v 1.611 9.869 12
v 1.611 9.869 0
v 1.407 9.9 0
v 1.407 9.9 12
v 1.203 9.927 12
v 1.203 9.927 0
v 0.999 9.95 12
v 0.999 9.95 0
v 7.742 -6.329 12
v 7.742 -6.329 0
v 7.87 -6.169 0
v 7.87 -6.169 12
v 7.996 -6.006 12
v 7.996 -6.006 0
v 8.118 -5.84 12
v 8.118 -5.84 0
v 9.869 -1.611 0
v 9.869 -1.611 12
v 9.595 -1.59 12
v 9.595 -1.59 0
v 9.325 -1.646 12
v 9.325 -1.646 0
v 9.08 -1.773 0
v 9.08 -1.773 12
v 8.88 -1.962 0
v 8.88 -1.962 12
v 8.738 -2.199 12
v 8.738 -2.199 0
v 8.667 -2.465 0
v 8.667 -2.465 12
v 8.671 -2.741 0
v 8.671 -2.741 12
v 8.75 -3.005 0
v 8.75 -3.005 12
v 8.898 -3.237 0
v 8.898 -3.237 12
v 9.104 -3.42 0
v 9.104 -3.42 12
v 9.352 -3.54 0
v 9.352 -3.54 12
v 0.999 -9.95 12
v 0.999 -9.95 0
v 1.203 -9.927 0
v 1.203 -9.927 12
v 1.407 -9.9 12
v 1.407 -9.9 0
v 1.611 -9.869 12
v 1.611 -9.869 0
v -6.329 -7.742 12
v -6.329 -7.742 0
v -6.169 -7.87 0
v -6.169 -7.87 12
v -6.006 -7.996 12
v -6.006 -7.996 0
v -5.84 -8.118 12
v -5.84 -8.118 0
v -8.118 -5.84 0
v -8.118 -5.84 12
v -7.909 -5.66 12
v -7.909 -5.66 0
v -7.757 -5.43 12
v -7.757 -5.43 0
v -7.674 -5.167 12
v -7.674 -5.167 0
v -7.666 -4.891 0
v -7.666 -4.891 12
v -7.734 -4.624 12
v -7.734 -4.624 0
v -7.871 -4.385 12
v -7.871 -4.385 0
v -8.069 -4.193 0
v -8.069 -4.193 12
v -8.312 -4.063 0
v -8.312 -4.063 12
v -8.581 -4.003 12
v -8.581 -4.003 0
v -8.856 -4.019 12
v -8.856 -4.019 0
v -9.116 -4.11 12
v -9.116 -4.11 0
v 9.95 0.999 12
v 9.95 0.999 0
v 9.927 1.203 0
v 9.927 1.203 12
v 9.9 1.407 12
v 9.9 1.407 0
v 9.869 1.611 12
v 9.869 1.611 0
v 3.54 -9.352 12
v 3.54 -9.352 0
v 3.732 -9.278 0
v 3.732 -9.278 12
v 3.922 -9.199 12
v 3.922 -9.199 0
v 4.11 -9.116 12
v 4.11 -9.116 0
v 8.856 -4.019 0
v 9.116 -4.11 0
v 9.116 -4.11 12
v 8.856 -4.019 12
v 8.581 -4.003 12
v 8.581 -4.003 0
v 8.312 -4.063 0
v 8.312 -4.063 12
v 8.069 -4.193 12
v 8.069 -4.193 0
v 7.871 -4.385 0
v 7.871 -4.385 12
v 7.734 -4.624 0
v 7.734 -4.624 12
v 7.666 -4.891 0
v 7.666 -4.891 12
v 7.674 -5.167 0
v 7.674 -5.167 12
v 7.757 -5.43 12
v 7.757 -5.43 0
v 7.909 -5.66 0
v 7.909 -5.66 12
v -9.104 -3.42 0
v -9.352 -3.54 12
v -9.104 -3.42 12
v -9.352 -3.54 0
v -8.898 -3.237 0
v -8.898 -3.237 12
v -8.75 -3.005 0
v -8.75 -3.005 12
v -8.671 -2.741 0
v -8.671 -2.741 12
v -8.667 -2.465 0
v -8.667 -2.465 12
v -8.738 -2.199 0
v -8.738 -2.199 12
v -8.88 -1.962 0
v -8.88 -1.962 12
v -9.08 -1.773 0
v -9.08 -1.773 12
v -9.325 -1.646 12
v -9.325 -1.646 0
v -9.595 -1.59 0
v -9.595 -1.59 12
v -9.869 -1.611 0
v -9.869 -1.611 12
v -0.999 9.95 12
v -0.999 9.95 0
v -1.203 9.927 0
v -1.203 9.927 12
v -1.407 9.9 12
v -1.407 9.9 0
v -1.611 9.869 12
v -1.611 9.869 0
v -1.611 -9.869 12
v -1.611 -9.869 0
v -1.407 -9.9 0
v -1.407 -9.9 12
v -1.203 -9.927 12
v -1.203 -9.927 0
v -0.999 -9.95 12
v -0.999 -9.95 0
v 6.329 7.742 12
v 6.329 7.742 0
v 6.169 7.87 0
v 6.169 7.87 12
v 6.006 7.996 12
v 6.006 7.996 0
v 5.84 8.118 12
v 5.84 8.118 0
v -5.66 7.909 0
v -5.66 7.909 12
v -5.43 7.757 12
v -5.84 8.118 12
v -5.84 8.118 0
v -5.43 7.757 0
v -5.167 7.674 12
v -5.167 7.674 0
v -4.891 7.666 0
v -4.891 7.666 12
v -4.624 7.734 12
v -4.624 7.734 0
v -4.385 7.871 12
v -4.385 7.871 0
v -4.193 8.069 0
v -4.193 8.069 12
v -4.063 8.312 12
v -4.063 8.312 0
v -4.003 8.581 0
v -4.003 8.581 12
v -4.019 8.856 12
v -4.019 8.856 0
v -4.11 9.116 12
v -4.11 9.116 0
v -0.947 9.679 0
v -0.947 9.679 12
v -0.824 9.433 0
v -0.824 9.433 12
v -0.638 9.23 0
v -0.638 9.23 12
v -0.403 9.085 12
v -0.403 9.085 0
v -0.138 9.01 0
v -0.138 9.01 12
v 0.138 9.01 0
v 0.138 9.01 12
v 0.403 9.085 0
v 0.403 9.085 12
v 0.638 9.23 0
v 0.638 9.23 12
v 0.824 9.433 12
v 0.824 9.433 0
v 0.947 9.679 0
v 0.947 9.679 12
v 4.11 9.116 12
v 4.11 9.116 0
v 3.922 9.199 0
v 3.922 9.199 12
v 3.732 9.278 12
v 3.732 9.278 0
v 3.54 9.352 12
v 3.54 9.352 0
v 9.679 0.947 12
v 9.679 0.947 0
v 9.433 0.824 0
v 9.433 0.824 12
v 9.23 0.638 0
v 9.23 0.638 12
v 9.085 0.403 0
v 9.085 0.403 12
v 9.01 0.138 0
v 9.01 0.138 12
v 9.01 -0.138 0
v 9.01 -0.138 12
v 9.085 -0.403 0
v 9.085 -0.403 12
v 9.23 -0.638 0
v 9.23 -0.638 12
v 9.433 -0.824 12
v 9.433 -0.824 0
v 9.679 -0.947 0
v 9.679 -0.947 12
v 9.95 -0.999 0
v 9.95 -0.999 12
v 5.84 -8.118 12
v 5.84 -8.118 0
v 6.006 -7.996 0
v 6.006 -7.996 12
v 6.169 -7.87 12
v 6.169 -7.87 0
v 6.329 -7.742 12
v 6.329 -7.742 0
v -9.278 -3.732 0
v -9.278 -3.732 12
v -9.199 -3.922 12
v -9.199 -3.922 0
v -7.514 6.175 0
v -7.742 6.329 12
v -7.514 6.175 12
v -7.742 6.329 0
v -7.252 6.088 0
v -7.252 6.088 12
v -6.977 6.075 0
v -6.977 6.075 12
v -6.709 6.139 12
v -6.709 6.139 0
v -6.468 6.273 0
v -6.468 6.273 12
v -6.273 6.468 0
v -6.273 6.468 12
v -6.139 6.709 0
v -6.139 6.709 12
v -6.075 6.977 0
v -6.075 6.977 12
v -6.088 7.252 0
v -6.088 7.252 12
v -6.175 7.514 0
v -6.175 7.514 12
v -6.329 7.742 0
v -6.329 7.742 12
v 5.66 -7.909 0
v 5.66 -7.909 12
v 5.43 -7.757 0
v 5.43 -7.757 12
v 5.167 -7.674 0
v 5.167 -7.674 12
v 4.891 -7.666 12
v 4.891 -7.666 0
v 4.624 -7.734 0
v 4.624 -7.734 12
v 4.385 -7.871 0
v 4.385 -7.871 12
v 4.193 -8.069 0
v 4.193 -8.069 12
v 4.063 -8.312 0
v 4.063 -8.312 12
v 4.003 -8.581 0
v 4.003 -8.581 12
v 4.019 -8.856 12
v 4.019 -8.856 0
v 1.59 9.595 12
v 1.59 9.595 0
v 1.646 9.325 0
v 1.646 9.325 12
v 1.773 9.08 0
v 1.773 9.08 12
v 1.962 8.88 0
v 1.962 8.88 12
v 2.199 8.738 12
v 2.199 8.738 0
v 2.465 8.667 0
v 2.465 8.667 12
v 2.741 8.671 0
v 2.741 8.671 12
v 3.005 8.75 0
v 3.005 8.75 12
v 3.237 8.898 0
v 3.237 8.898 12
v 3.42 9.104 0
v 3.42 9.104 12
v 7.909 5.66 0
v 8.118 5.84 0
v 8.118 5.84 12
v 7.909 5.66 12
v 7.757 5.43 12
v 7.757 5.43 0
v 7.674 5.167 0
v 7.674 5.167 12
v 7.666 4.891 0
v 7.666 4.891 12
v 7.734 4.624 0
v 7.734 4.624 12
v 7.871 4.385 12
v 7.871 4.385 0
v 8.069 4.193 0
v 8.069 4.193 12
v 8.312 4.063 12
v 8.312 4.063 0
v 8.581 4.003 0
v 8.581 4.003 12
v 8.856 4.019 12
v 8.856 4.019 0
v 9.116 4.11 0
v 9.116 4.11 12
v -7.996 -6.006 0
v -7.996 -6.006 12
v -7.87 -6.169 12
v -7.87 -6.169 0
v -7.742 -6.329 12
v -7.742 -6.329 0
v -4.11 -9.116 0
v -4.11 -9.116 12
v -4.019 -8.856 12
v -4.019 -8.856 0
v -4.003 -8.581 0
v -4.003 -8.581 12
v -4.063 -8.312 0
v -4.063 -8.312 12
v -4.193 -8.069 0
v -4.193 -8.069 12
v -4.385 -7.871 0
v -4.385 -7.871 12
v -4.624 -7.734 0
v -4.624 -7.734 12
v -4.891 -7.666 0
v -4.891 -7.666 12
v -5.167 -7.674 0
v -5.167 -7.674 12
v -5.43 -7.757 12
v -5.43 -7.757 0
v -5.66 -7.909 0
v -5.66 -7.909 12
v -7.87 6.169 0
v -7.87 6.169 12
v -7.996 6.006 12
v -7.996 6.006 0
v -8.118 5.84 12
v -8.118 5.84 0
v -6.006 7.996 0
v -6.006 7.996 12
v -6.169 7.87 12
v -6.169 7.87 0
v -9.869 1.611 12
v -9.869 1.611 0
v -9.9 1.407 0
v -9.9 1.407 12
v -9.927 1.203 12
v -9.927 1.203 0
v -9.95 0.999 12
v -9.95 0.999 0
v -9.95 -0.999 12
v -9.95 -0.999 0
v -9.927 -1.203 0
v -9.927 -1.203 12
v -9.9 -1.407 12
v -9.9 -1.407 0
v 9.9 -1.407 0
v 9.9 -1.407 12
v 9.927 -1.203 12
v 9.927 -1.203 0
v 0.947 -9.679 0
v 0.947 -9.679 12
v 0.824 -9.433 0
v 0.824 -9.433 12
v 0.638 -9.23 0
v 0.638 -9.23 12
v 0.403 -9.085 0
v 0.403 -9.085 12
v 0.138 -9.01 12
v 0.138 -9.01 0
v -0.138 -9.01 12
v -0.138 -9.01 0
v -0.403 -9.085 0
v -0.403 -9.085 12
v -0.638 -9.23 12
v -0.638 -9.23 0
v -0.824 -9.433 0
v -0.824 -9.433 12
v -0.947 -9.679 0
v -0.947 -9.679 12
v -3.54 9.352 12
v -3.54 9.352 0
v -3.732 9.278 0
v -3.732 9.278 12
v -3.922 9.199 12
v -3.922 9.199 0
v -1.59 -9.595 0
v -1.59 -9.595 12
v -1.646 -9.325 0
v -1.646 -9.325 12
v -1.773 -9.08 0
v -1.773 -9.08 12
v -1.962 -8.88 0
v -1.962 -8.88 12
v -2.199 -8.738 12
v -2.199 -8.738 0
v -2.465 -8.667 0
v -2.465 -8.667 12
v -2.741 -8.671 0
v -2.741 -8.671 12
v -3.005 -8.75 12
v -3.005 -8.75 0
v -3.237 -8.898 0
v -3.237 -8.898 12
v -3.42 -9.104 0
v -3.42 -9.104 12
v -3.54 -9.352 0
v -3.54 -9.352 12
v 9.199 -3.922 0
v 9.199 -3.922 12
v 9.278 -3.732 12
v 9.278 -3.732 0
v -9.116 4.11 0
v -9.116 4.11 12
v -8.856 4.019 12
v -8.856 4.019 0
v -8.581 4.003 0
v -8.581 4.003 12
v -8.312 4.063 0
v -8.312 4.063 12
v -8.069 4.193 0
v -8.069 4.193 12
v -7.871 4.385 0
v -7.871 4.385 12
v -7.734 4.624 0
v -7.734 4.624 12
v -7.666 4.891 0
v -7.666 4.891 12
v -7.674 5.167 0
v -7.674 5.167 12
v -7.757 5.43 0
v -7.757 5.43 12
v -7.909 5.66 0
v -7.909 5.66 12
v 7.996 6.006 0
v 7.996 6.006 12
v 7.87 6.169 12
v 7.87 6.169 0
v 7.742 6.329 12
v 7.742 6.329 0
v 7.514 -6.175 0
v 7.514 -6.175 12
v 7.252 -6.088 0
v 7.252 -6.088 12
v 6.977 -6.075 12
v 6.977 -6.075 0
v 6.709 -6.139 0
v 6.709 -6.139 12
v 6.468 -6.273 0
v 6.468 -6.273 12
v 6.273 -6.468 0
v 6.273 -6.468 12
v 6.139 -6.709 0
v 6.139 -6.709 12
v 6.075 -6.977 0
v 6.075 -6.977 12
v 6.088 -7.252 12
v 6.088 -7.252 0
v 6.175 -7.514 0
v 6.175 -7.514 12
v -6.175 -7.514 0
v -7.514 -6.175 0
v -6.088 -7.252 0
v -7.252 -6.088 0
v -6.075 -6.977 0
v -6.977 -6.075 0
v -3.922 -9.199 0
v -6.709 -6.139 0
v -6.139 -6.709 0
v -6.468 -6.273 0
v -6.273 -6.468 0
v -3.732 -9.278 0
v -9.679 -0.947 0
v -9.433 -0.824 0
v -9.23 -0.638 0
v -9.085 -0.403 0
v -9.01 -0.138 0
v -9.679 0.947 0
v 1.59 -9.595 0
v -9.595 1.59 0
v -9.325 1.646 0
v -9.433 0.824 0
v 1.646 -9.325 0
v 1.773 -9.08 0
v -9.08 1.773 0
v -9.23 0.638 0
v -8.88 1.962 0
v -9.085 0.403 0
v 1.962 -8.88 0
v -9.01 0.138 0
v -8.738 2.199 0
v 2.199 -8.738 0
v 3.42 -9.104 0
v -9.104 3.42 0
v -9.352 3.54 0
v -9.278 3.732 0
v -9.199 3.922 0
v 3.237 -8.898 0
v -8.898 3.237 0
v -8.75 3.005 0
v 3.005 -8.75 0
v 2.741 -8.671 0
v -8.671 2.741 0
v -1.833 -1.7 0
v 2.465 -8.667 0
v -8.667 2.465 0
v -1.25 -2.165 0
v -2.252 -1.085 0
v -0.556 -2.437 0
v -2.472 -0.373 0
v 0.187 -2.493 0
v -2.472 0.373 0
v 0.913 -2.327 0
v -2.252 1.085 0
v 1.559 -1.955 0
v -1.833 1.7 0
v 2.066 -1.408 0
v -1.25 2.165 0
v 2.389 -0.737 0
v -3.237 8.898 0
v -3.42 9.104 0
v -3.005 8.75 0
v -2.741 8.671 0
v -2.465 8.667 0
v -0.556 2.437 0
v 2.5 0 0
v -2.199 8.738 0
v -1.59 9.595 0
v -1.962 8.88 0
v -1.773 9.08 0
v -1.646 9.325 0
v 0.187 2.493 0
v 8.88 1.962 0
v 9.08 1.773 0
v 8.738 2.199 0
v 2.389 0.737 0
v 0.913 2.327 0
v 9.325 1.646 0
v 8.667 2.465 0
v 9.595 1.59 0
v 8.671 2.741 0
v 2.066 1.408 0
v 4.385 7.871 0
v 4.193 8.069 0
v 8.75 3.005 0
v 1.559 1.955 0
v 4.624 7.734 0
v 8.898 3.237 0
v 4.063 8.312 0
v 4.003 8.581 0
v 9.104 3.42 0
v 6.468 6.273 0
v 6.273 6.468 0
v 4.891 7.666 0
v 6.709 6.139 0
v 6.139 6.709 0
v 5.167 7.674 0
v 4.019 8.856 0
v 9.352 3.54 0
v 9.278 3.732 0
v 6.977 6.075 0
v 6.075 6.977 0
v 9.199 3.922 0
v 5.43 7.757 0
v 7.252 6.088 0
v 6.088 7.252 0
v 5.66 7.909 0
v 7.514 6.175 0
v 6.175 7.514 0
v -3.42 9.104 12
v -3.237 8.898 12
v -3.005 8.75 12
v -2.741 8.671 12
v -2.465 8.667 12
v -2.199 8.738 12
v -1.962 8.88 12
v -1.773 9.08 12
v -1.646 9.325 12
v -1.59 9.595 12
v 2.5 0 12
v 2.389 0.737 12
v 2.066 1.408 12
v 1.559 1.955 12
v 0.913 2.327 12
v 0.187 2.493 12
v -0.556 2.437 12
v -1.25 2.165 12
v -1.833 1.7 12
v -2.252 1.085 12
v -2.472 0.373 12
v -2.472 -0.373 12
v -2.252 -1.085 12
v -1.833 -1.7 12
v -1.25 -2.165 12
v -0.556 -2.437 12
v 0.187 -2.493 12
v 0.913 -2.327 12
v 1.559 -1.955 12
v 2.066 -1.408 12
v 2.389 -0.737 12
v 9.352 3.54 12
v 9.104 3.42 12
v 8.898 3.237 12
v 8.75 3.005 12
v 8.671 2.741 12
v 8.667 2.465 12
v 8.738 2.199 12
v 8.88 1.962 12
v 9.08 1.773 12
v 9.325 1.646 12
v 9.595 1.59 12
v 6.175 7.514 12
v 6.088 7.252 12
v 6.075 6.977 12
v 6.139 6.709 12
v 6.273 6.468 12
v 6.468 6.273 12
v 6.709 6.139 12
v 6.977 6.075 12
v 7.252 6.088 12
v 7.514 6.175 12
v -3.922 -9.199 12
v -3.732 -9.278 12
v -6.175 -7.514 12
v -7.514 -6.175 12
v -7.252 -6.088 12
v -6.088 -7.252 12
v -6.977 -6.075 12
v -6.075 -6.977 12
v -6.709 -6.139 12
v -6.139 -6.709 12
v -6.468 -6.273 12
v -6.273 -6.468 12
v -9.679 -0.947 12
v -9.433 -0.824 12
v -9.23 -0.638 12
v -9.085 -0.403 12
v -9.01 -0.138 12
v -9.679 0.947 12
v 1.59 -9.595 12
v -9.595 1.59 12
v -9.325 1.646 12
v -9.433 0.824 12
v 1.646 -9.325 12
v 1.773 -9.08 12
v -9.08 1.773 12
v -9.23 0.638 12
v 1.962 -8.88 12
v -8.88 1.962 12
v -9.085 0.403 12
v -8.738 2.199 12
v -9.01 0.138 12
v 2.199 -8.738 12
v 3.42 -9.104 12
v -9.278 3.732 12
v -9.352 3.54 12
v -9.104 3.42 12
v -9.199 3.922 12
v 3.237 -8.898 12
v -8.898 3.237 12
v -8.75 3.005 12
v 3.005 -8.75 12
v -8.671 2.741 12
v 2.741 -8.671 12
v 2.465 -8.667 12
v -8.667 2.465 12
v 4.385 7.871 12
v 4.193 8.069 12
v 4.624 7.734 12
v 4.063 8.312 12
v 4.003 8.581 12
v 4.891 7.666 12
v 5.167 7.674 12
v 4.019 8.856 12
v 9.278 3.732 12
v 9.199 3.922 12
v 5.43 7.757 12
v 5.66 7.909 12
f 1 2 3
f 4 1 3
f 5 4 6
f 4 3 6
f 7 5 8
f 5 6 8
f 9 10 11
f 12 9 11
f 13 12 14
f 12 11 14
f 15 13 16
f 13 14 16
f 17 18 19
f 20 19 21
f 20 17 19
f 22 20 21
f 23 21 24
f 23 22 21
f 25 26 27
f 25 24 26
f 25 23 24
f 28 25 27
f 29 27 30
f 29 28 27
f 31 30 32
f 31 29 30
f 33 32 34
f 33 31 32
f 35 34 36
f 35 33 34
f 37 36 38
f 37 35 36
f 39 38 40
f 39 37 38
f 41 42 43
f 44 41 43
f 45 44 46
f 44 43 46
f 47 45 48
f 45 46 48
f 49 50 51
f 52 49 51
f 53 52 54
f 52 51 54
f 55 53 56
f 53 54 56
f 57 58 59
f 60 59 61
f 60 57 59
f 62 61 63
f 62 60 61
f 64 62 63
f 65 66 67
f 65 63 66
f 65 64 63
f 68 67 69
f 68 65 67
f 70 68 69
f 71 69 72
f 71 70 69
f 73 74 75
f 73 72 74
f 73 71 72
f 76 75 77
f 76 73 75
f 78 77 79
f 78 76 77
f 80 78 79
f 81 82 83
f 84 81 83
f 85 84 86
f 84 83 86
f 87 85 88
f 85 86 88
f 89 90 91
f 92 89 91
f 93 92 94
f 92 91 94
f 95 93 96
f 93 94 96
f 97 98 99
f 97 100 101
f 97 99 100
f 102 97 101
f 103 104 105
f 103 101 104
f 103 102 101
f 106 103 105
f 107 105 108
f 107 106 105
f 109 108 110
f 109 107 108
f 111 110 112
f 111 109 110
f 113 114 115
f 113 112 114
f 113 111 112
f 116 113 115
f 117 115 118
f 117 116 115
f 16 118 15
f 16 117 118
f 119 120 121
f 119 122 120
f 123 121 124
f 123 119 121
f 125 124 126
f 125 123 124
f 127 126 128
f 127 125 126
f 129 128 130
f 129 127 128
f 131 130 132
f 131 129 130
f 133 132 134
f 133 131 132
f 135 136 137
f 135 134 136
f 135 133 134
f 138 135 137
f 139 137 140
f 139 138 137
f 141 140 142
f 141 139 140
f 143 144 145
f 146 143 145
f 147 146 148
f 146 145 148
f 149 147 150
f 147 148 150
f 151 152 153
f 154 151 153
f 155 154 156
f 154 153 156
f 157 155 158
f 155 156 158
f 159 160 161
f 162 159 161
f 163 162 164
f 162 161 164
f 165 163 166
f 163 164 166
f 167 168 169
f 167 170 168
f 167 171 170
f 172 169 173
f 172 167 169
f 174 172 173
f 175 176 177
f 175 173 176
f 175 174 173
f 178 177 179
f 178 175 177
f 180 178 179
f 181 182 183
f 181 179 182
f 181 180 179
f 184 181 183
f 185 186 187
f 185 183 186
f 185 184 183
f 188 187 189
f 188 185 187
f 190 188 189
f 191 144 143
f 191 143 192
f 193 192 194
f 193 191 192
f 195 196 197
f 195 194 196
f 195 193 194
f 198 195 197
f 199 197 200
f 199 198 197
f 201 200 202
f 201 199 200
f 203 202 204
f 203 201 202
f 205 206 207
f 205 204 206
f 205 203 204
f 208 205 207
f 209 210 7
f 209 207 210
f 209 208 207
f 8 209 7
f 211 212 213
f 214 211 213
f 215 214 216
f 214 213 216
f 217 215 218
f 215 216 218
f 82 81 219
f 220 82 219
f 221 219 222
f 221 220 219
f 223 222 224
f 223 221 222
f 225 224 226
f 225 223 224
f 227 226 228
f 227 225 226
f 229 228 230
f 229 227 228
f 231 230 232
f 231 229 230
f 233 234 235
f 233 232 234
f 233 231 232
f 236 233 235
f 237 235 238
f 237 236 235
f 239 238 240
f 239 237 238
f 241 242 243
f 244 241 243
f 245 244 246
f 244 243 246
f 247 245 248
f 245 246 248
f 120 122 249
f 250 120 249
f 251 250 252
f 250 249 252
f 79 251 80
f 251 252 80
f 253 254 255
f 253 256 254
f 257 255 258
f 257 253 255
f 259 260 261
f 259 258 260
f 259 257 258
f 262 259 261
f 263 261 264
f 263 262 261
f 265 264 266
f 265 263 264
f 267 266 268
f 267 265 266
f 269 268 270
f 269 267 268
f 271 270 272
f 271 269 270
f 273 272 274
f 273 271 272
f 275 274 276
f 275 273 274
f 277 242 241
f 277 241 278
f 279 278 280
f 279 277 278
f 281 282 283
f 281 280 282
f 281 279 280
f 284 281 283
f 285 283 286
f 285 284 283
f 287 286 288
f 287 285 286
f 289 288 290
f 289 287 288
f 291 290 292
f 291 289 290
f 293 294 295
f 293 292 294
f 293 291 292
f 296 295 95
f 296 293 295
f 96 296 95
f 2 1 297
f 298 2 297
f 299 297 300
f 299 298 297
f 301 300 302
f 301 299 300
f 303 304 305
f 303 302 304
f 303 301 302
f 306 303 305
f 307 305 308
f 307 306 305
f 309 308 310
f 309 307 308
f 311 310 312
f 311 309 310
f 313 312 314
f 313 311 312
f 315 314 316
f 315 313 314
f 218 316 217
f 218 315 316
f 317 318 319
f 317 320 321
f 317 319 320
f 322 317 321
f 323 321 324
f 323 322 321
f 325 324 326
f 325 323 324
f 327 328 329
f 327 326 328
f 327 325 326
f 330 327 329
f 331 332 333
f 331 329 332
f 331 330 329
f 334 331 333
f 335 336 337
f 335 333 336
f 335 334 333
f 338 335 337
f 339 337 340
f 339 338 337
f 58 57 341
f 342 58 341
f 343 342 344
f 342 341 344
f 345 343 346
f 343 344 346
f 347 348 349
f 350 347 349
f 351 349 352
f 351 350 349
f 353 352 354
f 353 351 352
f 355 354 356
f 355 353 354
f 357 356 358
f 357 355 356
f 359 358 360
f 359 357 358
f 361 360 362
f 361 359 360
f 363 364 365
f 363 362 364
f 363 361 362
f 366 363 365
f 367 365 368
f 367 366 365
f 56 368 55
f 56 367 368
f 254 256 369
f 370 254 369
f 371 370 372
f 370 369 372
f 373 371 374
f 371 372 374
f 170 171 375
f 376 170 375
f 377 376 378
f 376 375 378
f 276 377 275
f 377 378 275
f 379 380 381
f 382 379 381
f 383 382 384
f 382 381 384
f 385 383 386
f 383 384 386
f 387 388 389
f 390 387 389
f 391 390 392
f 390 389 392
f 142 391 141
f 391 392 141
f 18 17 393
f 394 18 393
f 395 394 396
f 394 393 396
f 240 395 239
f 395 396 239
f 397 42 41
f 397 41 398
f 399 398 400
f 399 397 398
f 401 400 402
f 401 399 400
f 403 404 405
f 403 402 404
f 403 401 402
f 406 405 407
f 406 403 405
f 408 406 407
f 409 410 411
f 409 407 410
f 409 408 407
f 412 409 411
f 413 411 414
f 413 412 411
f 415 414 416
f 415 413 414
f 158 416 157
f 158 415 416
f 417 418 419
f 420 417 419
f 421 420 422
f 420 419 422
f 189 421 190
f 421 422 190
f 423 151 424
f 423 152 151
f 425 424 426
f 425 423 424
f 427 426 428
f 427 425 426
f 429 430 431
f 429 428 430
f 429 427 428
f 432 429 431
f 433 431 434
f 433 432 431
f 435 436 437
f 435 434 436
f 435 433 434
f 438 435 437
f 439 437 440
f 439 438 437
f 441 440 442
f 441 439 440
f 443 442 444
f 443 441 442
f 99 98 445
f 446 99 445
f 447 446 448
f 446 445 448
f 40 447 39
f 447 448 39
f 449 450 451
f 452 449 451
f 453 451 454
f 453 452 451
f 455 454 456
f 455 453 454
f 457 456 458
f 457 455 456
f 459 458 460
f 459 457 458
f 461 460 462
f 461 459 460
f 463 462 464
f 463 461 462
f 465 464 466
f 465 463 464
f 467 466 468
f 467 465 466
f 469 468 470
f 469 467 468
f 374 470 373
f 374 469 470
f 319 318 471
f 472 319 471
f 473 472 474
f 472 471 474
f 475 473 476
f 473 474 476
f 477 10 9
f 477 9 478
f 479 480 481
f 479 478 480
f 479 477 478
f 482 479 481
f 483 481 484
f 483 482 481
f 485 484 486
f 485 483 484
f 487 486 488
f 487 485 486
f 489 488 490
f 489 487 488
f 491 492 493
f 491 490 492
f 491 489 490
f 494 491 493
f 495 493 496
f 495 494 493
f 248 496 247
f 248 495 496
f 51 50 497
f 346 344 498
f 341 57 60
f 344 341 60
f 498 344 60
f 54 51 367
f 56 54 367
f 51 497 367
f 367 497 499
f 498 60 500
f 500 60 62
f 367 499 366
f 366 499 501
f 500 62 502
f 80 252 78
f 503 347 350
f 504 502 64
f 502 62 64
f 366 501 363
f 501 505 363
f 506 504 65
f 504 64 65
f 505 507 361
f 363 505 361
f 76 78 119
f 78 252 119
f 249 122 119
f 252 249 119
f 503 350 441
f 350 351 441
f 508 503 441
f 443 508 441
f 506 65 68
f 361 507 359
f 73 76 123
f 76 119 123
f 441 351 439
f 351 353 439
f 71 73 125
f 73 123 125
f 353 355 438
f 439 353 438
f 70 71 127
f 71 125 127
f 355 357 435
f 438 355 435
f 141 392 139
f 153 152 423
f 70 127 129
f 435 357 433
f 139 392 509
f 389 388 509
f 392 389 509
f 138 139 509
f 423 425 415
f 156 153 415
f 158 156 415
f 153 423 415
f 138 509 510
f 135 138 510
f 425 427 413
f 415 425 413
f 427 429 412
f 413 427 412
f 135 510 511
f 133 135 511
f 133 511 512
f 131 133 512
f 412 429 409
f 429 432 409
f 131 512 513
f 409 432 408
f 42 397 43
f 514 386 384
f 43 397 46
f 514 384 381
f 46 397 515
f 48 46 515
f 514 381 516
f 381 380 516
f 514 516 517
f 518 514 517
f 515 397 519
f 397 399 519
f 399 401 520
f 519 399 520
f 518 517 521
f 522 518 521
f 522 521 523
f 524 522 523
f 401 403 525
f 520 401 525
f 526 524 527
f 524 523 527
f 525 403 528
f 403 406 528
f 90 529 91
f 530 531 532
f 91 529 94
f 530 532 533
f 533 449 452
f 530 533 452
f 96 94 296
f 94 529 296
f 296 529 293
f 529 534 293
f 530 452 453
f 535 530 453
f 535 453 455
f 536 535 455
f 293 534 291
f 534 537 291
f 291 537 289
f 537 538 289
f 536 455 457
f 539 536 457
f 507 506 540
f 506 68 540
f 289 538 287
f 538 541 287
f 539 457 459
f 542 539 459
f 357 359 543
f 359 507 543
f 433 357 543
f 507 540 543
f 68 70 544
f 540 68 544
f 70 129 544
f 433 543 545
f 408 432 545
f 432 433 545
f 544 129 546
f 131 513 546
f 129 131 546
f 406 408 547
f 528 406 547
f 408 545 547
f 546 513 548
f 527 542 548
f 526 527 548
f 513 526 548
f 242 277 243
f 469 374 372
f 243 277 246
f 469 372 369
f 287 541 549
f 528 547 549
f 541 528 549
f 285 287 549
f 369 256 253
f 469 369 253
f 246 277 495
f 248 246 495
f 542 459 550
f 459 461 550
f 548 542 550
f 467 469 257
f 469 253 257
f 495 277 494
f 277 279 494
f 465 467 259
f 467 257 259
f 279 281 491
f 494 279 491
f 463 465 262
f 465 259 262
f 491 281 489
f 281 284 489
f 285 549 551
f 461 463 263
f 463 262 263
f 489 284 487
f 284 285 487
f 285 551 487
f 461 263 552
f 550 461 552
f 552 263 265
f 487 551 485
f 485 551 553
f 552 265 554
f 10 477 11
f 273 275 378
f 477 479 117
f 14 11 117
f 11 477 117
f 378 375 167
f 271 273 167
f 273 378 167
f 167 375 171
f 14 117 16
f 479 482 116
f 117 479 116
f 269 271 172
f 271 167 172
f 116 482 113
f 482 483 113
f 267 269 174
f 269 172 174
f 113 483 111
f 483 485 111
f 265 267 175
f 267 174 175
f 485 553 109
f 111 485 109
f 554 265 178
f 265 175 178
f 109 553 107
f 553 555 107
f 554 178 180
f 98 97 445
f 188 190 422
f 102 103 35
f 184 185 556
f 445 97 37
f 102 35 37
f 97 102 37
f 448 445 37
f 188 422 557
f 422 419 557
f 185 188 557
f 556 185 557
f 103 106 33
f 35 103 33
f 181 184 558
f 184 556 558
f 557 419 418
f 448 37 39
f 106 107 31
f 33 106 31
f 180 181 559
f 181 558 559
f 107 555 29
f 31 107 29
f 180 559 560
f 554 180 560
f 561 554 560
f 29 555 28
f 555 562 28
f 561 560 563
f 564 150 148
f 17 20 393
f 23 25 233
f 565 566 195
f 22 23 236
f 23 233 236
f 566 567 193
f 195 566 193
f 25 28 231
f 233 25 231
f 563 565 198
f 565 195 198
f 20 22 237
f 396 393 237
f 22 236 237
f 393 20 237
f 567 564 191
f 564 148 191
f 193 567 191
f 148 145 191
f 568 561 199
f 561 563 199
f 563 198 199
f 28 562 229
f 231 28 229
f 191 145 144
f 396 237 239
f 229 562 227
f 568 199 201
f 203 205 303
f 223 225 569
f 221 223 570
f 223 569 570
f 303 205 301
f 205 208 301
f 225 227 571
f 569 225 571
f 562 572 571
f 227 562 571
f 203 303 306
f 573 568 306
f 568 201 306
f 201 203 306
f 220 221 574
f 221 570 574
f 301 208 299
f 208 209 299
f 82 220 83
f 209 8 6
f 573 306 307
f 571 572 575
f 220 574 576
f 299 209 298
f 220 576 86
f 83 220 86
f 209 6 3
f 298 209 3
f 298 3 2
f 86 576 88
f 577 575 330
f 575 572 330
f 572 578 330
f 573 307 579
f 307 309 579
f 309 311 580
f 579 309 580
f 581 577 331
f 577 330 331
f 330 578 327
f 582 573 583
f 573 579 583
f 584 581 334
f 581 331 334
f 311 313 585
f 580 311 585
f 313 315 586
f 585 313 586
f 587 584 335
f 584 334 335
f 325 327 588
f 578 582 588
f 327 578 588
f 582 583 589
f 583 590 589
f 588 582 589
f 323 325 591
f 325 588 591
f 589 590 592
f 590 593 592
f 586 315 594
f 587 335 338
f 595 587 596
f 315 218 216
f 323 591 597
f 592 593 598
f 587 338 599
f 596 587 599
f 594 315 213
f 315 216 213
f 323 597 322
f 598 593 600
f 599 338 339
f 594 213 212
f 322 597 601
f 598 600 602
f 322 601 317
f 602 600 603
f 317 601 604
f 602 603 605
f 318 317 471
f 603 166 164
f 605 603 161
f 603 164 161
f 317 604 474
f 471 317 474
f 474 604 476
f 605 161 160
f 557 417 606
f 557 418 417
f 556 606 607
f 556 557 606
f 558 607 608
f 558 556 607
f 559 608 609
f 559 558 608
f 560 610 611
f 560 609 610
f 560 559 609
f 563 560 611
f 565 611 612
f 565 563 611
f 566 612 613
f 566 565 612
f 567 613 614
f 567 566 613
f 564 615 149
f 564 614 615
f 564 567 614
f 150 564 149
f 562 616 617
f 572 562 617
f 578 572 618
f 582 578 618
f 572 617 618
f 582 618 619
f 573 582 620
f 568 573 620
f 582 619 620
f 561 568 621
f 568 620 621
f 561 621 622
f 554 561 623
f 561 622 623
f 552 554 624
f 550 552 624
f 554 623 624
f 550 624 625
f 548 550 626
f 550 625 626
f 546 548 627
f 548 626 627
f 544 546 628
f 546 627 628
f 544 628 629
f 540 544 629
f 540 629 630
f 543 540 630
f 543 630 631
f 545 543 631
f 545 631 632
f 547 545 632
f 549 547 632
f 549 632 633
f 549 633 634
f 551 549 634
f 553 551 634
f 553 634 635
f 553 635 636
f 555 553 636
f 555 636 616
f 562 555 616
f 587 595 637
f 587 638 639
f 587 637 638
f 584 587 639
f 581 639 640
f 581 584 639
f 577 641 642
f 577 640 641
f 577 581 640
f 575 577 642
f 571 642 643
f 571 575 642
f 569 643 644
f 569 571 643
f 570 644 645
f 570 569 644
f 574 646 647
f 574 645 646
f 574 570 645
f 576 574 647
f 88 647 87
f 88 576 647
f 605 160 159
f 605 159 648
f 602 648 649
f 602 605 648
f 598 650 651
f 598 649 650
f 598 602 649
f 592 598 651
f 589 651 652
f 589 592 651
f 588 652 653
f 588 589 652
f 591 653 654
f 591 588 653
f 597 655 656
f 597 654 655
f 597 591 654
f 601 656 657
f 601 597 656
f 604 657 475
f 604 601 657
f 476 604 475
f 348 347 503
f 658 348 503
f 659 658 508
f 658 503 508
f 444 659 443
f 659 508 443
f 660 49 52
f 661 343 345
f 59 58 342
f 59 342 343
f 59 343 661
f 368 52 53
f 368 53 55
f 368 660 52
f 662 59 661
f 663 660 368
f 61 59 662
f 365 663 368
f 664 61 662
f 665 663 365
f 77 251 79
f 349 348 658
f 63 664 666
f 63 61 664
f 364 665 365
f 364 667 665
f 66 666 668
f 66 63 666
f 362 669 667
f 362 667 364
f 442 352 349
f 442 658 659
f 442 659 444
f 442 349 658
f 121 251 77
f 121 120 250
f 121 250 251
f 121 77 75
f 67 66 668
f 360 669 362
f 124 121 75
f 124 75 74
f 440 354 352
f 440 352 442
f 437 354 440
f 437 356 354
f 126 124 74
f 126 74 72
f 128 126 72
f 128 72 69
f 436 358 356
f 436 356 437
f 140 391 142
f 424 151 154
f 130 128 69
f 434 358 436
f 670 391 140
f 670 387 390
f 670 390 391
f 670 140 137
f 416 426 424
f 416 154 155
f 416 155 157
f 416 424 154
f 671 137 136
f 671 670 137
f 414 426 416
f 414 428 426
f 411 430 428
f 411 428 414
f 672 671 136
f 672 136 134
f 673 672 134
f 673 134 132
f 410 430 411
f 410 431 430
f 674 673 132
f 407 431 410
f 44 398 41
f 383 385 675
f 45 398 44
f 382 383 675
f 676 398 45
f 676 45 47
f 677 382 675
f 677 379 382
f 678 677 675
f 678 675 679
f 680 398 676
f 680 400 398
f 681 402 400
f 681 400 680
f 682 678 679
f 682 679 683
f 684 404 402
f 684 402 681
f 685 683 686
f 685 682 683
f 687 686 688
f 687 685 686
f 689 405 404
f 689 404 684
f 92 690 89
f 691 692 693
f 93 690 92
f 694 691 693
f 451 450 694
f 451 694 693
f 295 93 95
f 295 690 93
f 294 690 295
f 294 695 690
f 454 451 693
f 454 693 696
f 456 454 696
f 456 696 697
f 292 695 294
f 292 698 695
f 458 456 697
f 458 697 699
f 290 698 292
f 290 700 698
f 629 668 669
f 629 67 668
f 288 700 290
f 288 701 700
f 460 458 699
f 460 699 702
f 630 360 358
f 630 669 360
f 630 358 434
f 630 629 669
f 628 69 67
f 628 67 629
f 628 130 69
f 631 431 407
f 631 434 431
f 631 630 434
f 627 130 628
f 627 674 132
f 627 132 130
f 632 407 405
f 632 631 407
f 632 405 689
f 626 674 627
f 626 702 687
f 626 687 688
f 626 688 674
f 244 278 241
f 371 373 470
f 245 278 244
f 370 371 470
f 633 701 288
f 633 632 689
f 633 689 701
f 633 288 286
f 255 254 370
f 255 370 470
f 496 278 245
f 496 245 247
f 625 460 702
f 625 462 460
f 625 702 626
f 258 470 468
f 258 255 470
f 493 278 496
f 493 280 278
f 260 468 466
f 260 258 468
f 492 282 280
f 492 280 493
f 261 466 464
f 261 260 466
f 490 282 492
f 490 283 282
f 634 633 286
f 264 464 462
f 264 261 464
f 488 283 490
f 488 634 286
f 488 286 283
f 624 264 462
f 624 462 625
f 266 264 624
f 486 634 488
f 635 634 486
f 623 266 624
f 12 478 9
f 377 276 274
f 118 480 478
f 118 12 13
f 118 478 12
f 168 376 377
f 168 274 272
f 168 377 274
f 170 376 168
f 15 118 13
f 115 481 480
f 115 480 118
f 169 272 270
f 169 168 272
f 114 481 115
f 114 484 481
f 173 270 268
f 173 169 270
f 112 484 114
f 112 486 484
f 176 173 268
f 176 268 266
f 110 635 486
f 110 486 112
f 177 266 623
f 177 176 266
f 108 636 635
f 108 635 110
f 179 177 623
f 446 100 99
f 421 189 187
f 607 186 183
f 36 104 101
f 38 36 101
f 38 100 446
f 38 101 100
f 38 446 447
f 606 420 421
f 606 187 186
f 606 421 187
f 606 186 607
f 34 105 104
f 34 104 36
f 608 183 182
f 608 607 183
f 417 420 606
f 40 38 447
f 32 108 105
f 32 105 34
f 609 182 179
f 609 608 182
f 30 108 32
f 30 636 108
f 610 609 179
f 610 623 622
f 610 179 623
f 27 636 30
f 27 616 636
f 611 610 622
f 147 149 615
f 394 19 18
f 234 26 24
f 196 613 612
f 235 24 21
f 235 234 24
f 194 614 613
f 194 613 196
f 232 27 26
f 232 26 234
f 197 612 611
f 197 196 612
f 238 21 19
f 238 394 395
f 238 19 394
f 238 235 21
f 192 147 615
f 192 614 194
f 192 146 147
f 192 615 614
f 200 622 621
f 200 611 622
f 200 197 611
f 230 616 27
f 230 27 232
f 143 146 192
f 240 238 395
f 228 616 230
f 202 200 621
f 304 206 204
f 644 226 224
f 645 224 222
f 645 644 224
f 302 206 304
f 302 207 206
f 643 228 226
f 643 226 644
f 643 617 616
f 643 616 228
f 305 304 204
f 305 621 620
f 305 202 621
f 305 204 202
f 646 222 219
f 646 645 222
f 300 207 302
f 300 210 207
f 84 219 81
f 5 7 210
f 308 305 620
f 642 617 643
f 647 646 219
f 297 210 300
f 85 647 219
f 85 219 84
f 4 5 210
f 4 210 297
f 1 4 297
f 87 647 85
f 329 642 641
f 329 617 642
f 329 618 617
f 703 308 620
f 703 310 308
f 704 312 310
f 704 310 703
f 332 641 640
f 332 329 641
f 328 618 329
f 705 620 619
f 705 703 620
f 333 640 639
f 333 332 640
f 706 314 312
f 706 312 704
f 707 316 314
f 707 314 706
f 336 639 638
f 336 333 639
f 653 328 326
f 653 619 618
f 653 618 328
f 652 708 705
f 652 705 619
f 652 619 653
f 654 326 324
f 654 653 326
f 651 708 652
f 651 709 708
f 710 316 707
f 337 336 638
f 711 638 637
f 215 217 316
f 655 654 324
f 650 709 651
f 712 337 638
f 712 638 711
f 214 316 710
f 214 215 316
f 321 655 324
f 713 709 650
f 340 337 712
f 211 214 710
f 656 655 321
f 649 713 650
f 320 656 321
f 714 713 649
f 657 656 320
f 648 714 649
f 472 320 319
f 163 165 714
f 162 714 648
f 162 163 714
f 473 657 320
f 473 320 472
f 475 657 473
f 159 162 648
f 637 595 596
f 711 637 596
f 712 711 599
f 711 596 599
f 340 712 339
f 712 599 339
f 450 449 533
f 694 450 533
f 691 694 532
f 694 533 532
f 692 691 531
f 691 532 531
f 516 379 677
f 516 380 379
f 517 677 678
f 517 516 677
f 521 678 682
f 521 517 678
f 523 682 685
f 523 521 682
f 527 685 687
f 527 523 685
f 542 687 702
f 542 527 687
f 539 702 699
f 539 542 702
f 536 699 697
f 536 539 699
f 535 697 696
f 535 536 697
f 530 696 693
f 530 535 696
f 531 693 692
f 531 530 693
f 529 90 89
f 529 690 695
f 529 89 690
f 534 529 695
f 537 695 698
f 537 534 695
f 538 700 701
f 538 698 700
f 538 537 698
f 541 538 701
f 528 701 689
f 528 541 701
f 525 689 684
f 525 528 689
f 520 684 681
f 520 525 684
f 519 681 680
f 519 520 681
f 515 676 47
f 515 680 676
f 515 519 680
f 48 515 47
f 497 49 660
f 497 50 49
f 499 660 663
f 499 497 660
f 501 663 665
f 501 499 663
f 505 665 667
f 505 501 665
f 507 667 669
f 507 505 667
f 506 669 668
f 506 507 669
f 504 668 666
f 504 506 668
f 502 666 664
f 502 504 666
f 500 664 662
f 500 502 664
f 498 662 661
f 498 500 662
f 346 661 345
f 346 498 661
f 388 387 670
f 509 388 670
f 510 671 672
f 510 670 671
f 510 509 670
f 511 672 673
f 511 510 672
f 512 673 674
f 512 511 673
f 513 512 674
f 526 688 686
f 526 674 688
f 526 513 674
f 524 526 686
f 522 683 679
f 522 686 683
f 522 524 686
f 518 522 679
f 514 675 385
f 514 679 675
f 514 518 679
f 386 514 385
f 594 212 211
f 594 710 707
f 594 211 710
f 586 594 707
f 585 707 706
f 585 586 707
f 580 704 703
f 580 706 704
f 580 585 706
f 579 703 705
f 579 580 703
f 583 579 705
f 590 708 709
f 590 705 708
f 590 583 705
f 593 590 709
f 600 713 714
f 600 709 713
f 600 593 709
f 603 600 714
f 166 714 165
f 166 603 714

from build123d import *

# Parameters (mm, degrees)
SKETCH1_R               = 10
BOSS_EXTRUDE1_DEPTH     = 12
CUT_EXTRUDE1_DEPTH      = 19.547236991
CUT_EXTRUDE1_DEPTH_BACK = 19.547236991
SKETCH2_R               = 1
SKETCH3_R               = 2.5
CUT_EXTRUDE2_DEPTH      = 19.493377193


with BuildPart() as part:
    # Sketch1 → Boss-Extrude1 (new body)
    with BuildSketch(Plane.XY):
        Circle(SKETCH1_R)
    extrude(amount=BOSS_EXTRUDE1_DEPTH)

    # Sketch2 → Cut-Extrude1 (cut, two sides: drawn at the far end of the back side and taken through both)
    with BuildSketch(Plane.XY.offset(12).offset(-CUT_EXTRUDE1_DEPTH_BACK)):
        with Locations((0, 10)):
            Circle(SKETCH2_R)
        with Locations((2.588190451, 9.659258263)):
            Circle(SKETCH2_R)
        with Locations((5, 8.660254038)):
            Circle(SKETCH2_R)
        with Locations((7.071067812, 7.071067812)):
            Circle(SKETCH2_R)
        with Locations((8.660254038, 5)):
            Circle(SKETCH2_R)
        with Locations((9.659258263, 2.588190451)):
            Circle(SKETCH2_R)
        with Locations((10, 0)):
            Circle(SKETCH2_R)
        with Locations((9.659258263, -2.588190451)):
            Circle(SKETCH2_R)
        with Locations((8.660254038, -5)):
            Circle(SKETCH2_R)
        with Locations((7.071067812, -7.071067812)):
            Circle(SKETCH2_R)
        with Locations((5, -8.660254038)):
            Circle(SKETCH2_R)
        with Locations((2.588190451, -9.659258263)):
            Circle(SKETCH2_R)
        with Locations((0, -10)):
            Circle(SKETCH2_R)
        with Locations((-2.588190451, -9.659258263)):
            Circle(SKETCH2_R)
        with Locations((-5, -8.660254038)):
            Circle(SKETCH2_R)
        with Locations((-7.071067812, -7.071067812)):
            Circle(SKETCH2_R)
        with Locations((-8.660254038, -5)):
            Circle(SKETCH2_R)
        with Locations((-9.659258263, -2.588190451)):
            Circle(SKETCH2_R)
        with Locations((-10, 0)):
            Circle(SKETCH2_R)
        with Locations((-9.659258263, 2.588190451)):
            Circle(SKETCH2_R)
        with Locations((-8.660254038, 5)):
            Circle(SKETCH2_R)
        with Locations((-7.071067812, 7.071067812)):
            Circle(SKETCH2_R)
        with Locations((-5, 8.660254038)):
            Circle(SKETCH2_R)
        with Locations((-2.588190451, 9.659258263)):
            Circle(SKETCH2_R)
    extrude(amount=CUT_EXTRUDE1_DEPTH + CUT_EXTRUDE1_DEPTH_BACK, mode=Mode.SUBTRACT)

    # Sketch3 → Cut-Extrude2 (cut, through all)
    with BuildSketch(Plane.XY.offset(12)):
        Circle(SKETCH3_R)
    extrude(amount=-CUT_EXTRUDE2_DEPTH, mode=Mode.SUBTRACT)


solid = part.part
